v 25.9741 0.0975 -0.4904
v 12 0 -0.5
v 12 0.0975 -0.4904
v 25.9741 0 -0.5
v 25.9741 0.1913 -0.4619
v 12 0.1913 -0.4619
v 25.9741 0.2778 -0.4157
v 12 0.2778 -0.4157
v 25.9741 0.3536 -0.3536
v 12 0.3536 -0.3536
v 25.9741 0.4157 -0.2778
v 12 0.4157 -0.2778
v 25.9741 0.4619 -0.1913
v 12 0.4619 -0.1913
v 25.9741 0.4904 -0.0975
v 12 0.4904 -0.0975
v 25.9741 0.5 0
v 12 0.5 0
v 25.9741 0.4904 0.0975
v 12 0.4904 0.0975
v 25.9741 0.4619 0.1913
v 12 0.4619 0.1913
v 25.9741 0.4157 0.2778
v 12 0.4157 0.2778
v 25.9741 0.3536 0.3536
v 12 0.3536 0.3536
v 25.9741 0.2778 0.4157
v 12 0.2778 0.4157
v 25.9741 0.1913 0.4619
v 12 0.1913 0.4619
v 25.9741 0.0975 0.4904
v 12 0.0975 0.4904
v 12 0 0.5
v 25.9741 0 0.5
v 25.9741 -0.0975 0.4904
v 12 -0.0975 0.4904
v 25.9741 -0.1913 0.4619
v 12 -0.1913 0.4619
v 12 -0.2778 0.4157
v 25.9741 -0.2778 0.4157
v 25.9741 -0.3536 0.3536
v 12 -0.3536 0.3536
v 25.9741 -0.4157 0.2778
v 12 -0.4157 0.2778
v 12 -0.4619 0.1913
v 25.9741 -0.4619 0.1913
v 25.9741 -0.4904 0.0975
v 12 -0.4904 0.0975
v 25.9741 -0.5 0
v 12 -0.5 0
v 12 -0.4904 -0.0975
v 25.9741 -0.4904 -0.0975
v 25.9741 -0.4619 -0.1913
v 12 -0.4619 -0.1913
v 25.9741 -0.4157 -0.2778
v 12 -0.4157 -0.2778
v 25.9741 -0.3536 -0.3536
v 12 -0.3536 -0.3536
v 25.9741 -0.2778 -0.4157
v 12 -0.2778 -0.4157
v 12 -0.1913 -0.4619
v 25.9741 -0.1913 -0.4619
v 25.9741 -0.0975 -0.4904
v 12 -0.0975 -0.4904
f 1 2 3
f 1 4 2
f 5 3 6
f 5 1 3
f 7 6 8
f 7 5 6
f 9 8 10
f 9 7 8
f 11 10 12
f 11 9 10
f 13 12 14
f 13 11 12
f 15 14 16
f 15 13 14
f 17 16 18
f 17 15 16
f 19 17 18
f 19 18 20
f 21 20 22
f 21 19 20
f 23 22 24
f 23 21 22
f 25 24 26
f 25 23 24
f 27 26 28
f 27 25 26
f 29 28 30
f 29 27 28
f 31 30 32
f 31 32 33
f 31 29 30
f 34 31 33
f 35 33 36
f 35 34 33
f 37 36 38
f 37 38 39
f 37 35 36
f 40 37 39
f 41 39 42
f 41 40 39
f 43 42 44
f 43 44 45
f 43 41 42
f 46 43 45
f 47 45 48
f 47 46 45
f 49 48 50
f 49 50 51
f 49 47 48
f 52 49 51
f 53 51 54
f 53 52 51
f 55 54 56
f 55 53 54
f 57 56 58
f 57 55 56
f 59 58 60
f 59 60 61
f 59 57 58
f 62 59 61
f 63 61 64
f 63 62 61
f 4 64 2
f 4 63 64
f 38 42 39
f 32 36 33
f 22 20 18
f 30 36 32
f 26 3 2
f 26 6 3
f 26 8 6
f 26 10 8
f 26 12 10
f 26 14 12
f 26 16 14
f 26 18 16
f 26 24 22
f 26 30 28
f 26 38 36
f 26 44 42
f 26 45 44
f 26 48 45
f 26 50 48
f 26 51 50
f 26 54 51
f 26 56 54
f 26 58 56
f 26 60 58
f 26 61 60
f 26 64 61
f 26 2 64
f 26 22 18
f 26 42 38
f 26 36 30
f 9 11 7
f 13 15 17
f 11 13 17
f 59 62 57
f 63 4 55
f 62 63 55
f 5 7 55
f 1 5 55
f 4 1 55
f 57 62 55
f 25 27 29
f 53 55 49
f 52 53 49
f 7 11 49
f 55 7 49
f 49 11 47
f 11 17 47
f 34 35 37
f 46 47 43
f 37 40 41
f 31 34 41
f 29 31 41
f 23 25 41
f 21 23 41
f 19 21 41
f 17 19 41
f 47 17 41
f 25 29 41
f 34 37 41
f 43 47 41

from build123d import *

# Parameters (mm, degrees)
IZIM2_R               = 0.5
KES_EKSTR_ZYON1_DEPTH = 10
IZIM4_W               = 23.900856007
IZIM4_H               = 1
IZIM4_W_2             = 0.459530198
KES_EKSTR_ZYON2_DEPTH = 10
KES_EKSTR_ZYON3_DEPTH = 0.3
IZIM6_R               = 0.5
KES_EKSTR_ZYON4_DEPTH = 7
IZIM7_R               = 0.5
KES_EKSTR_ZYON5_DEPTH = 5


with BuildPart() as part:
    # Süpür1: sweep along a path in Çizim1
    with BuildLine(Plane.XY) as s_p_r1_path:
        Line((0, 0), (50.361666029, 0))
    # Çizim2 → Süpür1 (sweep)
    with BuildSketch(Plane(origin=(50.361666029, 0, 0), x_dir=(0, 0, -1), z_dir=(1, 0, 0))):
        Circle(IZIM2_R)
    sweep(path=s_p_r1_path.line)

    # Çizim3 → Kes-Ekstrüzyon1 (cut)
    with BuildSketch(Plane.XY):
        Polygon((25.974112066, 2.781879013), (25.974112066, -2.743425523), (51.839823407, -2.743425523), (51.839823407, 3.328337703), align=None)
    extrude(amount=-KES_EKSTR_ZYON1_DEPTH, mode=Mode.SUBTRACT)

    # Çizim4 → Kes-Ekstrüzyon2 (cut)
    with BuildSketch(Plane(origin=(0, 0, 0), x_dir=(-1, 0, 0), z_dir=(0, 0, -1))):
        with Locations((-38.411238026, 0)):
            Rectangle(IZIM4_W, IZIM4_H)
        with Locations((-26.203877165, 0)):
            Rectangle(IZIM4_W_2, IZIM4_H)
    extrude(amount=-KES_EKSTR_ZYON2_DEPTH, mode=Mode.SUBTRACT)


with BuildPart() as kes_ekstr_zyon2_piece_1:
    # of the separate pieces the step leaves, piece 1, a body of its own (kes_ekstr_zyon2_pieces)
    add(part.part.solids().sort_by_distance((0, 0, -0.5))[0])

    # Çizim6 → Kes-Ekstrüzyon4 (cut)
    with BuildSketch(Plane(origin=(0, 0, 0), x_dir=(0, 0, -1), z_dir=(1, 0, 0))):
        Circle(IZIM6_R)
    extrude(amount=KES_EKSTR_ZYON4_DEPTH, mode=Mode.SUBTRACT)

    # Çizim7 → Kes-Ekstrüzyon5 (cut)
    with BuildSketch(Plane.ZY.offset(-7)):
        Circle(IZIM7_R)
    extrude(amount=-KES_EKSTR_ZYON5_DEPTH, mode=Mode.SUBTRACT)


with BuildPart() as kes_ekstr_zyon2_piece_2:
    # of the separate pieces the step leaves, piece 2, a body of its own (kes_ekstr_zyon2_pieces)
    add(part.part.solids().sort_by_distance((26.433642264, 0.5, 0))[0])

    # Çizim5 → Kes-Ekstrüzyon3 (cut)
    with BuildSketch(Plane(origin=(26.460810022, 0, 0), x_dir=(0, 0, -1), z_dir=(1, 0, 0))):
        with BuildLine():
            Line((0, 0.5), (0, -0.5))
            ThreePointArc((0, -0.5), (-0.5, 0), (0, 0.5))
        make_face()
    extrude(amount=-KES_EKSTR_ZYON3_DEPTH, mode=Mode.SUBTRACT)


solid = kes_ekstr_zyon2_piece_1.part
